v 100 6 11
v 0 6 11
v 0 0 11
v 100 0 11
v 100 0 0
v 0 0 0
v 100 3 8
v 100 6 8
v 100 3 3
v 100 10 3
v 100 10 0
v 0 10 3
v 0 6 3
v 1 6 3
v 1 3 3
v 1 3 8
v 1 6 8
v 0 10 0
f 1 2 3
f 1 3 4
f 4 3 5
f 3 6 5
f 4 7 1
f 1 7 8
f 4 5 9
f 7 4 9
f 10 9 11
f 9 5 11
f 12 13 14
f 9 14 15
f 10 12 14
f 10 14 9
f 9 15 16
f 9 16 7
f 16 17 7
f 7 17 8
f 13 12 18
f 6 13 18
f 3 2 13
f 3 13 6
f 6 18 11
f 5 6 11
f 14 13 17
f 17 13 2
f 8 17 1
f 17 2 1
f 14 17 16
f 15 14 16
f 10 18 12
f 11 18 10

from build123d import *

# Parameters (mm, degrees)
SKETCH_W     = 100
SKETCH_H     = 10
PAD_DEPTH    = 3
SKETCH001_W  = 100
SKETCH001_H  = 3
PAD001_DEPTH = 5
SKETCH002_W  = 100
SKETCH002_H  = 6
PAD002_DEPTH = 3
SKETCH003_W  = 1
SKETCH003_H  = 3
PAD003_DEPTH = 5


with BuildPart() as part:
    # Sketch → Pad (new body)
    with BuildSketch(Plane.XY):
        with Locations((50, 5)):
            Rectangle(SKETCH_W, SKETCH_H)
    extrude(amount=PAD_DEPTH)

    # Sketch001 (on Face6 of Pad) → Pad001 (join)
    with BuildSketch(Plane.XY.offset(3)):
        with Locations((50, 1.5)):
            Rectangle(SKETCH001_W, SKETCH001_H)
    extrude(amount=PAD001_DEPTH)

    # Sketch002 (on Face10 of Pad001) → Pad002 (join)
    with BuildSketch(Plane.XY.offset(8)):
        with Locations((50, 3)):
            Rectangle(SKETCH002_W, SKETCH002_H)
    extrude(amount=PAD002_DEPTH)

    # Sketch003 (on Face15 of Pad002) → Pad003 (join)
    with BuildSketch(Plane(origin=(0, 0, 8), x_dir=(1, 0, 0), z_dir=(0, 0, -1))):
        with Locations((0.5, -4.5)):
            Rectangle(SKETCH003_W, SKETCH003_H)
    extrude(amount=PAD003_DEPTH)


solid = part.part
